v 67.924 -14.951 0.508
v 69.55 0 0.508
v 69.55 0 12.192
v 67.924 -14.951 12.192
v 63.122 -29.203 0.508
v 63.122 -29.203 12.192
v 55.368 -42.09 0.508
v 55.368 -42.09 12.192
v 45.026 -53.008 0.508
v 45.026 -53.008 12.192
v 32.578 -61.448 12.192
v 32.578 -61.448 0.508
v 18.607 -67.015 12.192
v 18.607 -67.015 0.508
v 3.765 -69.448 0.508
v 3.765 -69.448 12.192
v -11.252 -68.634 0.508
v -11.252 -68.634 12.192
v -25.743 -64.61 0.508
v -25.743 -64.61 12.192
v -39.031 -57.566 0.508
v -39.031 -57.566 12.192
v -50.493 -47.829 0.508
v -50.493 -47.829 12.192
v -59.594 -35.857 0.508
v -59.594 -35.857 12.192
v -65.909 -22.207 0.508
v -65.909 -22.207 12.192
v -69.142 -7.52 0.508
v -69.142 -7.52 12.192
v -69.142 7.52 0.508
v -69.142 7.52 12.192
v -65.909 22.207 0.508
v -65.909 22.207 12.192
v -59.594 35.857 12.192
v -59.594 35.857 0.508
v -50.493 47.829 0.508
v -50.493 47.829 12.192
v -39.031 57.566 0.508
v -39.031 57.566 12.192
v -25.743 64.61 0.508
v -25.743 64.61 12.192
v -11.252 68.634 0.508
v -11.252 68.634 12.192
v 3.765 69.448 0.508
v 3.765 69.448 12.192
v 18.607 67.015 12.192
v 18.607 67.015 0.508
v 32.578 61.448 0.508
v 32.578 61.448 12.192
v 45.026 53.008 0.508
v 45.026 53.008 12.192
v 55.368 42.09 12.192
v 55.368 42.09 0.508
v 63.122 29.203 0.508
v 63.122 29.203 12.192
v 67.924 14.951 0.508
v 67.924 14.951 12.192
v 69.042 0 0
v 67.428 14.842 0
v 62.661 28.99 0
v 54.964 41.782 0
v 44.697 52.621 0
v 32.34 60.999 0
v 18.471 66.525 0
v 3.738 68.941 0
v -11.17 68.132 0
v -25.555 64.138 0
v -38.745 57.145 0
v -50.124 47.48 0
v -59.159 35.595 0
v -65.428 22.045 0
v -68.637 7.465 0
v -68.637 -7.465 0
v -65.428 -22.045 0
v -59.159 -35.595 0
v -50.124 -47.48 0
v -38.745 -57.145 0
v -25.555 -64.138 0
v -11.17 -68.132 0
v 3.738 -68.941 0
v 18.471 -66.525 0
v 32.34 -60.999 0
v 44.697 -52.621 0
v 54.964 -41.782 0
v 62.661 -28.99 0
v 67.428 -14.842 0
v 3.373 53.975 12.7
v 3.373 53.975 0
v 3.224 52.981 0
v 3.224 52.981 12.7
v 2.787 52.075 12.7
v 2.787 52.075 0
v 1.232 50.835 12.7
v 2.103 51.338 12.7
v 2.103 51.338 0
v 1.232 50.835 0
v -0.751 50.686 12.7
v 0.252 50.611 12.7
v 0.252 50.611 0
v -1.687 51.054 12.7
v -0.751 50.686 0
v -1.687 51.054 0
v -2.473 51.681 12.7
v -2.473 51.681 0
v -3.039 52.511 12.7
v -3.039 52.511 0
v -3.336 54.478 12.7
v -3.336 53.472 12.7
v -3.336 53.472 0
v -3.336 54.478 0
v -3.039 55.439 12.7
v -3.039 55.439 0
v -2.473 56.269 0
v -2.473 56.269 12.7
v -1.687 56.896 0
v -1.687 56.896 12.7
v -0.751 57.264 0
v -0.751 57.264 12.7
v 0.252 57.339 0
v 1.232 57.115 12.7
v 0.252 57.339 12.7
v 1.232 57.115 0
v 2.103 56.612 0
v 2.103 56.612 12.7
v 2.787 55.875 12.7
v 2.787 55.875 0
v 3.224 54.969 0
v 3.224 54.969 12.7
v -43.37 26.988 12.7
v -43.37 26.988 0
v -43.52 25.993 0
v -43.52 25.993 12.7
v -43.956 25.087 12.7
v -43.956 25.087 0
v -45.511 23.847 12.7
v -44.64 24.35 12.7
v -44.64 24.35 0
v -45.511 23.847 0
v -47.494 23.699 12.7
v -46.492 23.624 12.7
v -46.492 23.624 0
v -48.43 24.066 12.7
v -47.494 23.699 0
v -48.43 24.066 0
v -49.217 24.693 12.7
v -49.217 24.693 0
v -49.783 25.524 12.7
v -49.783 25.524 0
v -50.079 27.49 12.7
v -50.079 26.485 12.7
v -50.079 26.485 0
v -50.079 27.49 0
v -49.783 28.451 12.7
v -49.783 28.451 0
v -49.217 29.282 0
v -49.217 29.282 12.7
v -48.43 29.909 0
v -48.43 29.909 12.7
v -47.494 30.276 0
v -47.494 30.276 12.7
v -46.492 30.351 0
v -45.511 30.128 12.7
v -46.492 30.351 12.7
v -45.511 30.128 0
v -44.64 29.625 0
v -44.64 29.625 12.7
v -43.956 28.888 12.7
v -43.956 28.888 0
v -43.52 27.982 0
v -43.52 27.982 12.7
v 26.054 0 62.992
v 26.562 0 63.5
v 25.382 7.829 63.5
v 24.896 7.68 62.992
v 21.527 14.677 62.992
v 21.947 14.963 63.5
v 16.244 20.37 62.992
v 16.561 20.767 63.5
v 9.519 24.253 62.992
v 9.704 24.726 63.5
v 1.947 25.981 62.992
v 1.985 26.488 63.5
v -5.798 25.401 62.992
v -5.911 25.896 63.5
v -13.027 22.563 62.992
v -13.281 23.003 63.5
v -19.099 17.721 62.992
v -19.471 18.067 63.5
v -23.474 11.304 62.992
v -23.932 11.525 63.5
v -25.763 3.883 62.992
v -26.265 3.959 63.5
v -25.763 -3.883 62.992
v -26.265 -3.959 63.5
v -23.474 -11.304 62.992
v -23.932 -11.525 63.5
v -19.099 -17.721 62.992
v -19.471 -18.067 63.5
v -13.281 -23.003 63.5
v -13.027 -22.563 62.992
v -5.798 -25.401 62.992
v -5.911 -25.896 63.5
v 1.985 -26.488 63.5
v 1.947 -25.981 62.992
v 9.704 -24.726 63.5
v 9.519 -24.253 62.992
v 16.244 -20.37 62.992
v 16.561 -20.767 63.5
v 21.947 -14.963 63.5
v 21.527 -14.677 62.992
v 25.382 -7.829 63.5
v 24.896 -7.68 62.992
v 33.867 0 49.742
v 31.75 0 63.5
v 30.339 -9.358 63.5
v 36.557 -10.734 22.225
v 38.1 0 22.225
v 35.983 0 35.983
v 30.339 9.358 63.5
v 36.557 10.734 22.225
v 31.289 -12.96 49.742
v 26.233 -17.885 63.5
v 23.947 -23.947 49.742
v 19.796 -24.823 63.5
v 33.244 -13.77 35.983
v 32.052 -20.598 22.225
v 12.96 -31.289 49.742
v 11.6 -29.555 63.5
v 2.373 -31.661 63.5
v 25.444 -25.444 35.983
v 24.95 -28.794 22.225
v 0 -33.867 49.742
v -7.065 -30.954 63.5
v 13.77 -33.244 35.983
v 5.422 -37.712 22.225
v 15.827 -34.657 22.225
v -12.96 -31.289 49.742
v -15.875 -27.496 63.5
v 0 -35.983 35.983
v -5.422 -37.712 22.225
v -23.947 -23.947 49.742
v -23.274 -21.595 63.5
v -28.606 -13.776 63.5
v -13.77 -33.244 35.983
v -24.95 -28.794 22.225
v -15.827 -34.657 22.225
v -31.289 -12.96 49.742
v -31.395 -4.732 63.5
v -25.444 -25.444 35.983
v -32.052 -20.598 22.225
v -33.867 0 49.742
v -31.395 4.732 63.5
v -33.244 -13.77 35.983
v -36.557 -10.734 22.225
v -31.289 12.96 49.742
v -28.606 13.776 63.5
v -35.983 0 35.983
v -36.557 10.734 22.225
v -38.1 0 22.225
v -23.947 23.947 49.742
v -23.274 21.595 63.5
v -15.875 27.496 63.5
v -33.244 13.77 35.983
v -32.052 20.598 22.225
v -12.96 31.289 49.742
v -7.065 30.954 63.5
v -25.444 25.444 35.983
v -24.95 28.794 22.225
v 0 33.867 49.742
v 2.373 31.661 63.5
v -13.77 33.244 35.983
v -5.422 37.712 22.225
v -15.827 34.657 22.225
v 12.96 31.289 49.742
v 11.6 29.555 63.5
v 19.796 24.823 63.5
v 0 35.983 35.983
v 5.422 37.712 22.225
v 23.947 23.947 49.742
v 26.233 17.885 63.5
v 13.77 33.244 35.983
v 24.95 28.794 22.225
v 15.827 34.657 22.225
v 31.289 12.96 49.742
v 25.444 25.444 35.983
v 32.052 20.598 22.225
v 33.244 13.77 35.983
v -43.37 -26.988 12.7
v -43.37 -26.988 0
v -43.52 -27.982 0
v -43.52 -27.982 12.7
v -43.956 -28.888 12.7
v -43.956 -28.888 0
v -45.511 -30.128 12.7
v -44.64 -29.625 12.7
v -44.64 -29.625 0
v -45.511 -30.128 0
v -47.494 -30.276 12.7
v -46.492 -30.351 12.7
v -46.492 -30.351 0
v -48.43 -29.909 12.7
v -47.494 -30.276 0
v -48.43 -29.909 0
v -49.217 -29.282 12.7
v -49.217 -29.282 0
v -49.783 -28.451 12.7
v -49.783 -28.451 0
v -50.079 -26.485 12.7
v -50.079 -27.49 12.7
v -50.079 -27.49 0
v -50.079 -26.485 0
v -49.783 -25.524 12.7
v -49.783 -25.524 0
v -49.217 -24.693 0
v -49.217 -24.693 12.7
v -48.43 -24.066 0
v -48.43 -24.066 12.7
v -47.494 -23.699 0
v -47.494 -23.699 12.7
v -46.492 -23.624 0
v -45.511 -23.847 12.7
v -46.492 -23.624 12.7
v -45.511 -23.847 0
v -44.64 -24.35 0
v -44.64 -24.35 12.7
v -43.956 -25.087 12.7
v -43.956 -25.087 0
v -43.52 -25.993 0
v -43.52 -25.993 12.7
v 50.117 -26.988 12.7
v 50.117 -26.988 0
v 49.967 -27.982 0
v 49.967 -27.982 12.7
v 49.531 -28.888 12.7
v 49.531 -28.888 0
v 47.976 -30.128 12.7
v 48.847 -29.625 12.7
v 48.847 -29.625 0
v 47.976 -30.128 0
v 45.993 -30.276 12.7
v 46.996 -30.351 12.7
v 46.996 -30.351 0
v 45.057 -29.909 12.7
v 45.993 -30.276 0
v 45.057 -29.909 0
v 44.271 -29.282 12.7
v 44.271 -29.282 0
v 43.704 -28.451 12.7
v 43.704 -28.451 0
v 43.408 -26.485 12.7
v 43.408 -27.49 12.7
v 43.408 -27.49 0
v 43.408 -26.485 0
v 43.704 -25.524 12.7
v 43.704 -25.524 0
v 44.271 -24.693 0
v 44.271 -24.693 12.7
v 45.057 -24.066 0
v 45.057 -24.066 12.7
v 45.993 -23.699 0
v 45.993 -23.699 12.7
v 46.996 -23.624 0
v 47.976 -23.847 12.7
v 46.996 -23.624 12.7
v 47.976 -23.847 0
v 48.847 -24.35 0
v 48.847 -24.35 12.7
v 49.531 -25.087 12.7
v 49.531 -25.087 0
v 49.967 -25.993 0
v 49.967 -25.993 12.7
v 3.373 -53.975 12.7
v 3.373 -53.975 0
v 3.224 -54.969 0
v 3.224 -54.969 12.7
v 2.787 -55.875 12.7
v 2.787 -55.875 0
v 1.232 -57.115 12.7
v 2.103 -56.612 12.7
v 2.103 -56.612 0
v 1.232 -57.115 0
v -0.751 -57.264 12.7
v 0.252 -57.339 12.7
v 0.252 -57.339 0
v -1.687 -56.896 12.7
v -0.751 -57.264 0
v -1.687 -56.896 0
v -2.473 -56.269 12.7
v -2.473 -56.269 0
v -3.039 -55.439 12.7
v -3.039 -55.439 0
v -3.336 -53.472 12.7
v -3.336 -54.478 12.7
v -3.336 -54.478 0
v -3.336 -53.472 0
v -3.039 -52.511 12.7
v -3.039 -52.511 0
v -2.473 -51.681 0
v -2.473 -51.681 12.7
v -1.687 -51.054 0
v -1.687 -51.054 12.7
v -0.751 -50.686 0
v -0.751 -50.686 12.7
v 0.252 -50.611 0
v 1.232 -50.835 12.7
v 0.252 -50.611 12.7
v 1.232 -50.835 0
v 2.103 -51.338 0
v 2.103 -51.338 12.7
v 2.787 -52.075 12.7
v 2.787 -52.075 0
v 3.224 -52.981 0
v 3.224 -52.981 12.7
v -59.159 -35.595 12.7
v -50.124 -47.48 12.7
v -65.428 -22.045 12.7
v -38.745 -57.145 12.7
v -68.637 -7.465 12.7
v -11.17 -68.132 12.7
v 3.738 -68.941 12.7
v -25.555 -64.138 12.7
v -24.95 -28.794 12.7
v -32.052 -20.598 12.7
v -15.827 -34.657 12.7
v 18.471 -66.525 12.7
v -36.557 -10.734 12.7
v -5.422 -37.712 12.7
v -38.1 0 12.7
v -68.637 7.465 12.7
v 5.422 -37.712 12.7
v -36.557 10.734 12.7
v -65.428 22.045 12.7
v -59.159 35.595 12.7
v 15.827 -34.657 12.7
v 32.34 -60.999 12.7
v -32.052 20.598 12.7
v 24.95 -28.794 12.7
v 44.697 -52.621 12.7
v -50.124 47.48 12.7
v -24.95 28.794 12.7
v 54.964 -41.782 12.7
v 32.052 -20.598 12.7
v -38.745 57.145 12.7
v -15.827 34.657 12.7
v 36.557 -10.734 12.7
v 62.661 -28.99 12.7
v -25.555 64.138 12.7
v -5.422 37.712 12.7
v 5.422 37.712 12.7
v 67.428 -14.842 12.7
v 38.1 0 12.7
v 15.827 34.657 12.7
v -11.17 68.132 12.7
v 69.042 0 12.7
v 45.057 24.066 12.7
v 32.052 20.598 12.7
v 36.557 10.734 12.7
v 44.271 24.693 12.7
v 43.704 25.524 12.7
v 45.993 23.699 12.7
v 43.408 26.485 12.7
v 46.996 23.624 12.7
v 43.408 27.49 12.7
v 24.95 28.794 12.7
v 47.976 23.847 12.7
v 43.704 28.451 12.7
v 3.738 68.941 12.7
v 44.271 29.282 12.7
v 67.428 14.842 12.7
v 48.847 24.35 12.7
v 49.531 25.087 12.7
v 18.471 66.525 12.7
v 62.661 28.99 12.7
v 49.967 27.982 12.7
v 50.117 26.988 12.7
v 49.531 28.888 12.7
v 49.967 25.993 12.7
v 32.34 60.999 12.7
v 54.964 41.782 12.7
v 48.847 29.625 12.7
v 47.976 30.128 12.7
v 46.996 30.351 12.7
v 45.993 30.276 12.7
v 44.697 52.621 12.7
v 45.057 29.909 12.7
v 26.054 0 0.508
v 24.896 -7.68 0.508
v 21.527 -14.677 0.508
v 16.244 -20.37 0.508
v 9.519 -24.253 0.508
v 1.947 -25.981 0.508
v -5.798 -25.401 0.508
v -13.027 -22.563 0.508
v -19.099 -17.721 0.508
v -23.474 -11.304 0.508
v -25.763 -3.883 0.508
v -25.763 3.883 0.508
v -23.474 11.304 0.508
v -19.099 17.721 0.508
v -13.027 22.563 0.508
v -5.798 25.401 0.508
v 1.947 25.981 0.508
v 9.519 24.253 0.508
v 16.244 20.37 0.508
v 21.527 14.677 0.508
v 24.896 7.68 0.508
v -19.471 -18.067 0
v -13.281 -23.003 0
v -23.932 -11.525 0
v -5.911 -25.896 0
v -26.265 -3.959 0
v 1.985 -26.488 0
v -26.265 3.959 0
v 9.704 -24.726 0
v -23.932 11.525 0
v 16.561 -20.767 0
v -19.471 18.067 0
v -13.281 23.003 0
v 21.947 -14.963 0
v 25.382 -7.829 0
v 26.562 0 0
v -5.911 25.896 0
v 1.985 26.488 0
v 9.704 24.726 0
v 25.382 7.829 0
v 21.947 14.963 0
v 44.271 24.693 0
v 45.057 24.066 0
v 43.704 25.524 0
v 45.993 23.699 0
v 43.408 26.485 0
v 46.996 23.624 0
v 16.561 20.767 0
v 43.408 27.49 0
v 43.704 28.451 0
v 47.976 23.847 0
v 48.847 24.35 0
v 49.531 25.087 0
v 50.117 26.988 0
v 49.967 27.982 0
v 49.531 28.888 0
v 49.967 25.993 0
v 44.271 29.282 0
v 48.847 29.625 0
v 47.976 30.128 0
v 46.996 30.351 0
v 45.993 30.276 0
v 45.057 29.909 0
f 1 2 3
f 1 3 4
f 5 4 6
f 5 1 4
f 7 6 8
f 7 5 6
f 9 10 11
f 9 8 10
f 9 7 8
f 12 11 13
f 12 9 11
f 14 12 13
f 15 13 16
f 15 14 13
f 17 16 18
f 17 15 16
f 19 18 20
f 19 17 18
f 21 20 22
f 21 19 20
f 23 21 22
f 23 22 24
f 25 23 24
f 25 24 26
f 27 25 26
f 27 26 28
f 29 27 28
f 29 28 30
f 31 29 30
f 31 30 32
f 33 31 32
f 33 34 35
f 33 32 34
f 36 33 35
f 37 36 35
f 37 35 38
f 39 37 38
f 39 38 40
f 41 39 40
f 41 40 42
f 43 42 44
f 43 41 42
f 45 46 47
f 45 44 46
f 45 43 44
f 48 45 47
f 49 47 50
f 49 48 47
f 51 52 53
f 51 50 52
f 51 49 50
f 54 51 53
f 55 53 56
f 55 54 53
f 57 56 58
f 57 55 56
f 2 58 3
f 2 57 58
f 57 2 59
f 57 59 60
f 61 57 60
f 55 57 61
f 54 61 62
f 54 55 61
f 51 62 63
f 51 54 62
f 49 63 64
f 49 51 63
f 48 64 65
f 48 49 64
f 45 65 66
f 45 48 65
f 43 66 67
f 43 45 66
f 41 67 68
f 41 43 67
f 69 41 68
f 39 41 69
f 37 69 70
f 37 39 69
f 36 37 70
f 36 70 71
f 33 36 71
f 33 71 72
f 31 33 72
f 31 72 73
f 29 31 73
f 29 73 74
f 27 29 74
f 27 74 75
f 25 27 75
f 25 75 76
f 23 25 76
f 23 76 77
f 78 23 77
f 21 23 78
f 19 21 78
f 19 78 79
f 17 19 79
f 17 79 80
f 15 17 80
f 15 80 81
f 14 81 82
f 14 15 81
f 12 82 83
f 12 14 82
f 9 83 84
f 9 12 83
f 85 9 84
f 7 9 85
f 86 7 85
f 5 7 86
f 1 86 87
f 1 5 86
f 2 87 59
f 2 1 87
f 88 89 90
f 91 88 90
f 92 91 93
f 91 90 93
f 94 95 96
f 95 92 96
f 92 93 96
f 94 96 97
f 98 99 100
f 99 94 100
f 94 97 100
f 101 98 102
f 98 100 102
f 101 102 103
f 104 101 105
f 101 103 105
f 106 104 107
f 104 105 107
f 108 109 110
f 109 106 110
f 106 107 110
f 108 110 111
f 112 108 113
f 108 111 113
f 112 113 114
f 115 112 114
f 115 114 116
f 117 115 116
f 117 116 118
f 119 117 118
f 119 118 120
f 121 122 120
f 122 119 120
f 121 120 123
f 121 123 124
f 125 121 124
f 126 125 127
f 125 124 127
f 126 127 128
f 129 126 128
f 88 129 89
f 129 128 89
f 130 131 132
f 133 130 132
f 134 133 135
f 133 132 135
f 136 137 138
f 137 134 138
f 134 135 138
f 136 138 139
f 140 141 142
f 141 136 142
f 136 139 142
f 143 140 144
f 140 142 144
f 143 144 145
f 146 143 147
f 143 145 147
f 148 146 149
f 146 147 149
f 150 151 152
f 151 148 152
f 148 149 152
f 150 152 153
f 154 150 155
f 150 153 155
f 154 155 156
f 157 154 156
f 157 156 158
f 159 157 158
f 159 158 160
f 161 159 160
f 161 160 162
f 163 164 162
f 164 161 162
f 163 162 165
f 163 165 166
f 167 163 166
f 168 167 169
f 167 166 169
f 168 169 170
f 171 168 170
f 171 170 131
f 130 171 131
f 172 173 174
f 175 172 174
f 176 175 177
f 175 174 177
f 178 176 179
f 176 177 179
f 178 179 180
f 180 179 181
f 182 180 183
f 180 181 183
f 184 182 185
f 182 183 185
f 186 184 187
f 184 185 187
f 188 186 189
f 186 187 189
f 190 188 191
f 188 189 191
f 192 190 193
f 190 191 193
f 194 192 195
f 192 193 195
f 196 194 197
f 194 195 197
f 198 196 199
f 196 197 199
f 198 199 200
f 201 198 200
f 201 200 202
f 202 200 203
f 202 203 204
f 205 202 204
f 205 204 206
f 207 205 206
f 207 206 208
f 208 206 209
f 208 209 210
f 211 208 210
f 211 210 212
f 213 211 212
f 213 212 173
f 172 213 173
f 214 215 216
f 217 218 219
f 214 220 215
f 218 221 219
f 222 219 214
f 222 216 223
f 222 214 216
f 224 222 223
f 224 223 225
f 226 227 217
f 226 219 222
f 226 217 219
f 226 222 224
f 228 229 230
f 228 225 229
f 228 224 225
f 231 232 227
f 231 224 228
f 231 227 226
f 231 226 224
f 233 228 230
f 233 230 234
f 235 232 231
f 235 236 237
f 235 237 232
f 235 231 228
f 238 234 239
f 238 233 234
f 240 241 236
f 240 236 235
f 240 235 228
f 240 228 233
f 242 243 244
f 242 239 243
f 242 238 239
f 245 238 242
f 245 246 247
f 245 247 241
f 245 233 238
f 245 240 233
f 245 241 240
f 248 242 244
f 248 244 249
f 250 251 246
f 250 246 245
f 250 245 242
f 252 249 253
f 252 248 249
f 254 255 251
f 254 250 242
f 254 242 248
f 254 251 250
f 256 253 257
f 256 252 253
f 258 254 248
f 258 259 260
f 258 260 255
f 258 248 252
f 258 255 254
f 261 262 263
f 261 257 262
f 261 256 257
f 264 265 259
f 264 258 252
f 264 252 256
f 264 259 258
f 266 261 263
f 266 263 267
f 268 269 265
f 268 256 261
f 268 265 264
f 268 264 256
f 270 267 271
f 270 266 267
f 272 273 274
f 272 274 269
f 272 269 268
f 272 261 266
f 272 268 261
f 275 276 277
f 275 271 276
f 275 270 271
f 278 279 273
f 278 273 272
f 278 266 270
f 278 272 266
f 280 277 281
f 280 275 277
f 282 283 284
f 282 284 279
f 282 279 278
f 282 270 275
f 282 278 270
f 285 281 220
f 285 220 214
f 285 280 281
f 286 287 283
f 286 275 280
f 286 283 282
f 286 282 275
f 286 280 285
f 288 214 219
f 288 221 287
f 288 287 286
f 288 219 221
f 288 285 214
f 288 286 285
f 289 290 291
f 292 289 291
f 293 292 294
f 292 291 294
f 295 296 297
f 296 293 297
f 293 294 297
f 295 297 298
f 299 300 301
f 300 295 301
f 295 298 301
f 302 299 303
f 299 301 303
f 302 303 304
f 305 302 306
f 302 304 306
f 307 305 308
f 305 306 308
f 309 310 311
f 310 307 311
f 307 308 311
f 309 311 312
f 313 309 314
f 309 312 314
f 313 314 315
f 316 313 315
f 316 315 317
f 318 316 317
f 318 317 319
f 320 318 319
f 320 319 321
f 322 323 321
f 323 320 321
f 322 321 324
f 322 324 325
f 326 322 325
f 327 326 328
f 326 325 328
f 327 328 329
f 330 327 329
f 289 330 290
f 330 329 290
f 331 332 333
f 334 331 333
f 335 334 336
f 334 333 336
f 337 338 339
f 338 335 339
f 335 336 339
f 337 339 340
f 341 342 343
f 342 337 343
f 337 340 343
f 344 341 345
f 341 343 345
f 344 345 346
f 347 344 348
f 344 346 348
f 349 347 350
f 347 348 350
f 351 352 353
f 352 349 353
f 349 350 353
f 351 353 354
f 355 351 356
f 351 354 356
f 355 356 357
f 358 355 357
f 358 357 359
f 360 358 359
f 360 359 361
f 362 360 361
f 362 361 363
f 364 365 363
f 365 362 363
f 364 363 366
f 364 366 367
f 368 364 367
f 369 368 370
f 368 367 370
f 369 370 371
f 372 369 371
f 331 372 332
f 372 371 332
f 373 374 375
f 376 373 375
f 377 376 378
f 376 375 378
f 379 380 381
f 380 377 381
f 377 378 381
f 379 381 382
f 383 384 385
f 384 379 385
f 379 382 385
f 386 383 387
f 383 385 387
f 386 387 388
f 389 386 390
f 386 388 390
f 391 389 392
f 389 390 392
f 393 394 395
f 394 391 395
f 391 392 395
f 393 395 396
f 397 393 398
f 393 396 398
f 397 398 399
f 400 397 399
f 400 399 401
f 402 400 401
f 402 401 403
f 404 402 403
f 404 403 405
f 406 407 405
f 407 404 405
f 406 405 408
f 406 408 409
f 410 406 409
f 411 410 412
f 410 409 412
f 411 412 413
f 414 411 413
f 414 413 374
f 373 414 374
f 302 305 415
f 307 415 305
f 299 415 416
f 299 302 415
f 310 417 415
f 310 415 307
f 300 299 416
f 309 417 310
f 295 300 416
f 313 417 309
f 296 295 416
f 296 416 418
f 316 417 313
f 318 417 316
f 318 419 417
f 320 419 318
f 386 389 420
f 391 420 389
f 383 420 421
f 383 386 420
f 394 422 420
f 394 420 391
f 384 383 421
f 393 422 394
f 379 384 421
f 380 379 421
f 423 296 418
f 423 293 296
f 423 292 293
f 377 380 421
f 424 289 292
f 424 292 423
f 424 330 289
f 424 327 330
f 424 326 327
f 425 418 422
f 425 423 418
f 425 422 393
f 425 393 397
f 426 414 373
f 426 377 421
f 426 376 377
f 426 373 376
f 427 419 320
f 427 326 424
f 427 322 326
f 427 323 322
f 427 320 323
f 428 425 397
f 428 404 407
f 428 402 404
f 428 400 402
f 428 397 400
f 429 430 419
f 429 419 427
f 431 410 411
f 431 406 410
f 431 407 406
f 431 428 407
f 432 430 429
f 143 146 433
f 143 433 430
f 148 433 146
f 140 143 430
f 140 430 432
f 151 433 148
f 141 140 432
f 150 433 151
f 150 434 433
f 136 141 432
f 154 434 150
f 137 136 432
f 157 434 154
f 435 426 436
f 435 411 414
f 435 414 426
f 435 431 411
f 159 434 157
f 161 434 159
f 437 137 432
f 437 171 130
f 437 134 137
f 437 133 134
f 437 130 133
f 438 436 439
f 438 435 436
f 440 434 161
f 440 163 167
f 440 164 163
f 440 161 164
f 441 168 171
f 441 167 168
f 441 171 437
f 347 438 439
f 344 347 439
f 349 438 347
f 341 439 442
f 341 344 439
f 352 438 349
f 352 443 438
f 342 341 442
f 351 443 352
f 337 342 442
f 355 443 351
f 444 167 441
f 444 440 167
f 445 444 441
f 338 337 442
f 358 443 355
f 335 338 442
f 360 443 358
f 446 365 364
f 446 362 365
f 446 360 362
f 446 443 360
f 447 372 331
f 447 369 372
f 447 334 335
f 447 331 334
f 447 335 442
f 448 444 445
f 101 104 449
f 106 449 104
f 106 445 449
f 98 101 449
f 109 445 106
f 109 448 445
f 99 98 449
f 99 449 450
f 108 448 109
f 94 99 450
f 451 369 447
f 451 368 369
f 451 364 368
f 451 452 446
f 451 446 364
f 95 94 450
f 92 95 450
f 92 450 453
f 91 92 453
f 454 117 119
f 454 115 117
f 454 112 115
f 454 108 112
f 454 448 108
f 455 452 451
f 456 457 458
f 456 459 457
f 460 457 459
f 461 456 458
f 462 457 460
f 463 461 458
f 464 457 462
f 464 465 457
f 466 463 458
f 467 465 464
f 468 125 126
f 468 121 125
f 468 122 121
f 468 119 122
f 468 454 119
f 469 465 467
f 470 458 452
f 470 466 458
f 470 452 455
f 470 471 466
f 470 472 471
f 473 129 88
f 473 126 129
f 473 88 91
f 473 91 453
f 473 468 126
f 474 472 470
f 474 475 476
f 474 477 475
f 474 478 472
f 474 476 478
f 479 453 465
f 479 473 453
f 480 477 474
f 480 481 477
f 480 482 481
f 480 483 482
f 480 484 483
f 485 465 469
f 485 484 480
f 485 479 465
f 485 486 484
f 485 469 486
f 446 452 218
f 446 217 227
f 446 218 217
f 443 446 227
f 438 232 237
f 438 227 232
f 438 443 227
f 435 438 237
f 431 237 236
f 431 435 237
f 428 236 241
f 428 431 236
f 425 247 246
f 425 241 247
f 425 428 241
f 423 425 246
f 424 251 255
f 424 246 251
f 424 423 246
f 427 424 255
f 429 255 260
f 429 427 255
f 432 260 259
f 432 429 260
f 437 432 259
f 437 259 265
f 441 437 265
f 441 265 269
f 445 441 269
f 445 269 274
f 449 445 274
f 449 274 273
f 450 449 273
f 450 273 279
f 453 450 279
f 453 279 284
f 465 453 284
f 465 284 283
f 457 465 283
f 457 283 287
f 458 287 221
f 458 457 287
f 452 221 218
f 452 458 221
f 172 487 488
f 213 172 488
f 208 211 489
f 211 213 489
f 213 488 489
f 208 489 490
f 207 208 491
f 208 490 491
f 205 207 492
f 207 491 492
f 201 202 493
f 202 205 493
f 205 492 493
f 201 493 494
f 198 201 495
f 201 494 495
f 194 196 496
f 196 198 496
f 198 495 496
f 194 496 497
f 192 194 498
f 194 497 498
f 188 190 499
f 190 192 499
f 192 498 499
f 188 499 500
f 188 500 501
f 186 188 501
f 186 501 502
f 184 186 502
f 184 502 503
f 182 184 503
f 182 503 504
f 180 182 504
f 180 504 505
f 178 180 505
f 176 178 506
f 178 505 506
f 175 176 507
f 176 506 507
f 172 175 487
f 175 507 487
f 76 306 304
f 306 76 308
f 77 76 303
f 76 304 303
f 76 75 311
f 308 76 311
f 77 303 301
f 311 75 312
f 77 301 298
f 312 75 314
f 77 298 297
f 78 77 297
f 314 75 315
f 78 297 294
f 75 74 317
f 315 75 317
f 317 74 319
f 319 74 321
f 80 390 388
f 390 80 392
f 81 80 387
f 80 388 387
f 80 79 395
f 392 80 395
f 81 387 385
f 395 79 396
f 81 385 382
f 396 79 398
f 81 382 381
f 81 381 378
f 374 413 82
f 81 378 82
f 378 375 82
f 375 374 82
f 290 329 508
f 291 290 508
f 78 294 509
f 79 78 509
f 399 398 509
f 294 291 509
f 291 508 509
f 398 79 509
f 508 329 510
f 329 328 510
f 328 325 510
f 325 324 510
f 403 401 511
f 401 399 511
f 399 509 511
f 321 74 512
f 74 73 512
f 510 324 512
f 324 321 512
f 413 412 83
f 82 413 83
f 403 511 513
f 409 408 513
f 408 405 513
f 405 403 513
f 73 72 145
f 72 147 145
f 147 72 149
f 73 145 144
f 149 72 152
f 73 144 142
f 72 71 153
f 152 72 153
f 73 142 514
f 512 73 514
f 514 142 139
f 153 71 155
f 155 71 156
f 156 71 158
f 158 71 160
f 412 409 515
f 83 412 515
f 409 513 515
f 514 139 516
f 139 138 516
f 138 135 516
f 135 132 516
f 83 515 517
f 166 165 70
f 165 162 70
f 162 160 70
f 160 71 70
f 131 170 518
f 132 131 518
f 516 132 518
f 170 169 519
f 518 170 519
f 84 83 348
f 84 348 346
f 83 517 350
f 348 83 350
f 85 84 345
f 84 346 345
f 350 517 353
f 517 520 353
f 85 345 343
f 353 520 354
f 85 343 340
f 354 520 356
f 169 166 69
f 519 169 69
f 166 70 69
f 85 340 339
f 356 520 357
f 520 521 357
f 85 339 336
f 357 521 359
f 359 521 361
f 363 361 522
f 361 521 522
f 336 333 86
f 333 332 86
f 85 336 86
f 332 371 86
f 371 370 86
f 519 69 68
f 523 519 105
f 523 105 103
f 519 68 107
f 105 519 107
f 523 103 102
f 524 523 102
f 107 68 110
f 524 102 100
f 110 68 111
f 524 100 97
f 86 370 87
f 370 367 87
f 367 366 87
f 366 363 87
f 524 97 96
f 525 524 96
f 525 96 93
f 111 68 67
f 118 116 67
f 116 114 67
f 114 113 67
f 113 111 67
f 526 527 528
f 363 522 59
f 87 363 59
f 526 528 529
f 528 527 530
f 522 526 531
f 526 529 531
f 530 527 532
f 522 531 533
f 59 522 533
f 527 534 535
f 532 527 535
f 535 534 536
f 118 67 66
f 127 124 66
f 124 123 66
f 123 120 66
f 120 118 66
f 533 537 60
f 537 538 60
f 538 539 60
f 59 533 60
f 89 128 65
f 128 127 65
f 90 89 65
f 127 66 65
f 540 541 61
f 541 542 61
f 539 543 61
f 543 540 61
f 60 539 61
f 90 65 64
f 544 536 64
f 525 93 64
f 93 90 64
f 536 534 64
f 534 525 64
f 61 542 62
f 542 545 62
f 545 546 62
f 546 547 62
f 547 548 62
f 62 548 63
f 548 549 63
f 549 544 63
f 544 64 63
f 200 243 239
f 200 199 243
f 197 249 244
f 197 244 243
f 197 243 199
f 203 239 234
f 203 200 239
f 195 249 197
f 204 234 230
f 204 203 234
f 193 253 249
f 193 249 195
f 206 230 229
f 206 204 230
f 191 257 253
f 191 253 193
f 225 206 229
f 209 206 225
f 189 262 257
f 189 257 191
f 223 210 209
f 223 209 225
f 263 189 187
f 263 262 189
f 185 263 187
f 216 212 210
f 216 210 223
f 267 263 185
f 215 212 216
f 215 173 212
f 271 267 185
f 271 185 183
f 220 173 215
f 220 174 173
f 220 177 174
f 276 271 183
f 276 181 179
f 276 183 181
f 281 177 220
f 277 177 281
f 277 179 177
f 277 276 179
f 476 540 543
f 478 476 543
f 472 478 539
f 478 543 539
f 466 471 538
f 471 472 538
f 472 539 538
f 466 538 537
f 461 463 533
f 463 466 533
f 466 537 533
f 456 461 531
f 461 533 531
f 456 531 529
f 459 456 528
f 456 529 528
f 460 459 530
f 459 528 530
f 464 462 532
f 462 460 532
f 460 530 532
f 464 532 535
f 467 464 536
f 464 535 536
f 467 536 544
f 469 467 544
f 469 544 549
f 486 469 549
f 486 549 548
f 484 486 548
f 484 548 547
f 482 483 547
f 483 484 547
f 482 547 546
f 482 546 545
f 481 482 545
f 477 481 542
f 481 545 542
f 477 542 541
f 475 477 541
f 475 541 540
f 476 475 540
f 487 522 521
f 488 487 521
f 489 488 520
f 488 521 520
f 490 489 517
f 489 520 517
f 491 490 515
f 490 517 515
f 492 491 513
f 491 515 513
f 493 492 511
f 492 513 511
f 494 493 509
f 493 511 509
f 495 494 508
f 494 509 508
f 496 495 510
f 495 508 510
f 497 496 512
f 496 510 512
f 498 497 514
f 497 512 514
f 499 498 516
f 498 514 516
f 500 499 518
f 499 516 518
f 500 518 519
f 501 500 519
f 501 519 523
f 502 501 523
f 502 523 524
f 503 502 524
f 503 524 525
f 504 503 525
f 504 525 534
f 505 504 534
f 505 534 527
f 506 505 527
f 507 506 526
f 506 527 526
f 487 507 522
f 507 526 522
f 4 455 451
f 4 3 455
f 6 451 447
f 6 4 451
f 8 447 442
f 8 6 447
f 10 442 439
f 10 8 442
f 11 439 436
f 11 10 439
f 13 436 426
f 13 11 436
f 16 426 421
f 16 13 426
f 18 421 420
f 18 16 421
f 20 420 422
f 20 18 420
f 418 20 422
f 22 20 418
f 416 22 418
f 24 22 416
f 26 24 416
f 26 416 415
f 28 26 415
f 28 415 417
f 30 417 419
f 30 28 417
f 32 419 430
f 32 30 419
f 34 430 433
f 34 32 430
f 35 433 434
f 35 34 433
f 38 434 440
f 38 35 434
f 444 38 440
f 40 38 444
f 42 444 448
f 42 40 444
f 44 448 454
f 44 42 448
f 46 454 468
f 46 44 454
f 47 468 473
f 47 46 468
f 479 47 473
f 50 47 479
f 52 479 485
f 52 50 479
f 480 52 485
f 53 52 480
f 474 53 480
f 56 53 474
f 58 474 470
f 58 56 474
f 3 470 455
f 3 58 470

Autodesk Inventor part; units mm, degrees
ref_plane "YZ Plane" through (0, 0, 0) normal (1, 0, 0) x (0, 1, 0)
ref_plane "XZ Plane" through (0, 0, 0) normal (0, 1, 0) x (-1, 0, 0)
ref_plane "XY Plane" through (0, 0, 0) normal (0, 0, 1) x (1, 0, 0)
sketch "Sketch1" plane through (0, 0, 0) normal (0, 0, 1) x (1, 0, 0)
  circle A0 centre (0, 0) radius 26.054
  circle A1 centre (0, 0) radius 69.55
  circle A2 centre (0, 53.975) radius 3.3734
  circle A3 centre (-46.7437, 26.9875) radius 3.3734
  circle A4 centre (-46.7437, -26.9875) radius 3.3734
  circle A5 centre (0, -53.975) radius 3.3734
  circle A6 centre (46.7437, -26.9875) radius 3.3734
  circle A7 centre (46.7437, 26.9875) radius 3.3734
  dimension "d0" = 52.108
  dimension "d1" = 139.1
  dimension "d2" = 6.7469
  dimension "d3" = 53.975
  dimension "d6" = 360
extrude "Extrusion1" add sketch "Sketch1" along normal blind 12.7
sketch "Sketch2" plane through (0, 0, 12.7) normal (0, 0, 1) x (1, 0, 0)
  circle A0 centre (0, 0) radius 38.1
  circle A1 centre (0, 0) radius 26.054 projected
  dimension "d10" = 76.2
extrude "Extrusion2" add sketch "Sketch2" along normal blind 50.8
chamfer "Chamfer1" distance 6.35 distance2 41.275 1 edges at (-38.1, 0, 63.5) measured on face at (33.7663, -2.826, 63.5)
chamfer "Chamfer2" distance 0.508 angle 45 4 edges at (-69.55, 0, 12.7) (-69.55, 0, 0) (-26.054, 0, 0) (-26.054, 0, 63.5)
properties part number "ExtendedIndexerPivot"
